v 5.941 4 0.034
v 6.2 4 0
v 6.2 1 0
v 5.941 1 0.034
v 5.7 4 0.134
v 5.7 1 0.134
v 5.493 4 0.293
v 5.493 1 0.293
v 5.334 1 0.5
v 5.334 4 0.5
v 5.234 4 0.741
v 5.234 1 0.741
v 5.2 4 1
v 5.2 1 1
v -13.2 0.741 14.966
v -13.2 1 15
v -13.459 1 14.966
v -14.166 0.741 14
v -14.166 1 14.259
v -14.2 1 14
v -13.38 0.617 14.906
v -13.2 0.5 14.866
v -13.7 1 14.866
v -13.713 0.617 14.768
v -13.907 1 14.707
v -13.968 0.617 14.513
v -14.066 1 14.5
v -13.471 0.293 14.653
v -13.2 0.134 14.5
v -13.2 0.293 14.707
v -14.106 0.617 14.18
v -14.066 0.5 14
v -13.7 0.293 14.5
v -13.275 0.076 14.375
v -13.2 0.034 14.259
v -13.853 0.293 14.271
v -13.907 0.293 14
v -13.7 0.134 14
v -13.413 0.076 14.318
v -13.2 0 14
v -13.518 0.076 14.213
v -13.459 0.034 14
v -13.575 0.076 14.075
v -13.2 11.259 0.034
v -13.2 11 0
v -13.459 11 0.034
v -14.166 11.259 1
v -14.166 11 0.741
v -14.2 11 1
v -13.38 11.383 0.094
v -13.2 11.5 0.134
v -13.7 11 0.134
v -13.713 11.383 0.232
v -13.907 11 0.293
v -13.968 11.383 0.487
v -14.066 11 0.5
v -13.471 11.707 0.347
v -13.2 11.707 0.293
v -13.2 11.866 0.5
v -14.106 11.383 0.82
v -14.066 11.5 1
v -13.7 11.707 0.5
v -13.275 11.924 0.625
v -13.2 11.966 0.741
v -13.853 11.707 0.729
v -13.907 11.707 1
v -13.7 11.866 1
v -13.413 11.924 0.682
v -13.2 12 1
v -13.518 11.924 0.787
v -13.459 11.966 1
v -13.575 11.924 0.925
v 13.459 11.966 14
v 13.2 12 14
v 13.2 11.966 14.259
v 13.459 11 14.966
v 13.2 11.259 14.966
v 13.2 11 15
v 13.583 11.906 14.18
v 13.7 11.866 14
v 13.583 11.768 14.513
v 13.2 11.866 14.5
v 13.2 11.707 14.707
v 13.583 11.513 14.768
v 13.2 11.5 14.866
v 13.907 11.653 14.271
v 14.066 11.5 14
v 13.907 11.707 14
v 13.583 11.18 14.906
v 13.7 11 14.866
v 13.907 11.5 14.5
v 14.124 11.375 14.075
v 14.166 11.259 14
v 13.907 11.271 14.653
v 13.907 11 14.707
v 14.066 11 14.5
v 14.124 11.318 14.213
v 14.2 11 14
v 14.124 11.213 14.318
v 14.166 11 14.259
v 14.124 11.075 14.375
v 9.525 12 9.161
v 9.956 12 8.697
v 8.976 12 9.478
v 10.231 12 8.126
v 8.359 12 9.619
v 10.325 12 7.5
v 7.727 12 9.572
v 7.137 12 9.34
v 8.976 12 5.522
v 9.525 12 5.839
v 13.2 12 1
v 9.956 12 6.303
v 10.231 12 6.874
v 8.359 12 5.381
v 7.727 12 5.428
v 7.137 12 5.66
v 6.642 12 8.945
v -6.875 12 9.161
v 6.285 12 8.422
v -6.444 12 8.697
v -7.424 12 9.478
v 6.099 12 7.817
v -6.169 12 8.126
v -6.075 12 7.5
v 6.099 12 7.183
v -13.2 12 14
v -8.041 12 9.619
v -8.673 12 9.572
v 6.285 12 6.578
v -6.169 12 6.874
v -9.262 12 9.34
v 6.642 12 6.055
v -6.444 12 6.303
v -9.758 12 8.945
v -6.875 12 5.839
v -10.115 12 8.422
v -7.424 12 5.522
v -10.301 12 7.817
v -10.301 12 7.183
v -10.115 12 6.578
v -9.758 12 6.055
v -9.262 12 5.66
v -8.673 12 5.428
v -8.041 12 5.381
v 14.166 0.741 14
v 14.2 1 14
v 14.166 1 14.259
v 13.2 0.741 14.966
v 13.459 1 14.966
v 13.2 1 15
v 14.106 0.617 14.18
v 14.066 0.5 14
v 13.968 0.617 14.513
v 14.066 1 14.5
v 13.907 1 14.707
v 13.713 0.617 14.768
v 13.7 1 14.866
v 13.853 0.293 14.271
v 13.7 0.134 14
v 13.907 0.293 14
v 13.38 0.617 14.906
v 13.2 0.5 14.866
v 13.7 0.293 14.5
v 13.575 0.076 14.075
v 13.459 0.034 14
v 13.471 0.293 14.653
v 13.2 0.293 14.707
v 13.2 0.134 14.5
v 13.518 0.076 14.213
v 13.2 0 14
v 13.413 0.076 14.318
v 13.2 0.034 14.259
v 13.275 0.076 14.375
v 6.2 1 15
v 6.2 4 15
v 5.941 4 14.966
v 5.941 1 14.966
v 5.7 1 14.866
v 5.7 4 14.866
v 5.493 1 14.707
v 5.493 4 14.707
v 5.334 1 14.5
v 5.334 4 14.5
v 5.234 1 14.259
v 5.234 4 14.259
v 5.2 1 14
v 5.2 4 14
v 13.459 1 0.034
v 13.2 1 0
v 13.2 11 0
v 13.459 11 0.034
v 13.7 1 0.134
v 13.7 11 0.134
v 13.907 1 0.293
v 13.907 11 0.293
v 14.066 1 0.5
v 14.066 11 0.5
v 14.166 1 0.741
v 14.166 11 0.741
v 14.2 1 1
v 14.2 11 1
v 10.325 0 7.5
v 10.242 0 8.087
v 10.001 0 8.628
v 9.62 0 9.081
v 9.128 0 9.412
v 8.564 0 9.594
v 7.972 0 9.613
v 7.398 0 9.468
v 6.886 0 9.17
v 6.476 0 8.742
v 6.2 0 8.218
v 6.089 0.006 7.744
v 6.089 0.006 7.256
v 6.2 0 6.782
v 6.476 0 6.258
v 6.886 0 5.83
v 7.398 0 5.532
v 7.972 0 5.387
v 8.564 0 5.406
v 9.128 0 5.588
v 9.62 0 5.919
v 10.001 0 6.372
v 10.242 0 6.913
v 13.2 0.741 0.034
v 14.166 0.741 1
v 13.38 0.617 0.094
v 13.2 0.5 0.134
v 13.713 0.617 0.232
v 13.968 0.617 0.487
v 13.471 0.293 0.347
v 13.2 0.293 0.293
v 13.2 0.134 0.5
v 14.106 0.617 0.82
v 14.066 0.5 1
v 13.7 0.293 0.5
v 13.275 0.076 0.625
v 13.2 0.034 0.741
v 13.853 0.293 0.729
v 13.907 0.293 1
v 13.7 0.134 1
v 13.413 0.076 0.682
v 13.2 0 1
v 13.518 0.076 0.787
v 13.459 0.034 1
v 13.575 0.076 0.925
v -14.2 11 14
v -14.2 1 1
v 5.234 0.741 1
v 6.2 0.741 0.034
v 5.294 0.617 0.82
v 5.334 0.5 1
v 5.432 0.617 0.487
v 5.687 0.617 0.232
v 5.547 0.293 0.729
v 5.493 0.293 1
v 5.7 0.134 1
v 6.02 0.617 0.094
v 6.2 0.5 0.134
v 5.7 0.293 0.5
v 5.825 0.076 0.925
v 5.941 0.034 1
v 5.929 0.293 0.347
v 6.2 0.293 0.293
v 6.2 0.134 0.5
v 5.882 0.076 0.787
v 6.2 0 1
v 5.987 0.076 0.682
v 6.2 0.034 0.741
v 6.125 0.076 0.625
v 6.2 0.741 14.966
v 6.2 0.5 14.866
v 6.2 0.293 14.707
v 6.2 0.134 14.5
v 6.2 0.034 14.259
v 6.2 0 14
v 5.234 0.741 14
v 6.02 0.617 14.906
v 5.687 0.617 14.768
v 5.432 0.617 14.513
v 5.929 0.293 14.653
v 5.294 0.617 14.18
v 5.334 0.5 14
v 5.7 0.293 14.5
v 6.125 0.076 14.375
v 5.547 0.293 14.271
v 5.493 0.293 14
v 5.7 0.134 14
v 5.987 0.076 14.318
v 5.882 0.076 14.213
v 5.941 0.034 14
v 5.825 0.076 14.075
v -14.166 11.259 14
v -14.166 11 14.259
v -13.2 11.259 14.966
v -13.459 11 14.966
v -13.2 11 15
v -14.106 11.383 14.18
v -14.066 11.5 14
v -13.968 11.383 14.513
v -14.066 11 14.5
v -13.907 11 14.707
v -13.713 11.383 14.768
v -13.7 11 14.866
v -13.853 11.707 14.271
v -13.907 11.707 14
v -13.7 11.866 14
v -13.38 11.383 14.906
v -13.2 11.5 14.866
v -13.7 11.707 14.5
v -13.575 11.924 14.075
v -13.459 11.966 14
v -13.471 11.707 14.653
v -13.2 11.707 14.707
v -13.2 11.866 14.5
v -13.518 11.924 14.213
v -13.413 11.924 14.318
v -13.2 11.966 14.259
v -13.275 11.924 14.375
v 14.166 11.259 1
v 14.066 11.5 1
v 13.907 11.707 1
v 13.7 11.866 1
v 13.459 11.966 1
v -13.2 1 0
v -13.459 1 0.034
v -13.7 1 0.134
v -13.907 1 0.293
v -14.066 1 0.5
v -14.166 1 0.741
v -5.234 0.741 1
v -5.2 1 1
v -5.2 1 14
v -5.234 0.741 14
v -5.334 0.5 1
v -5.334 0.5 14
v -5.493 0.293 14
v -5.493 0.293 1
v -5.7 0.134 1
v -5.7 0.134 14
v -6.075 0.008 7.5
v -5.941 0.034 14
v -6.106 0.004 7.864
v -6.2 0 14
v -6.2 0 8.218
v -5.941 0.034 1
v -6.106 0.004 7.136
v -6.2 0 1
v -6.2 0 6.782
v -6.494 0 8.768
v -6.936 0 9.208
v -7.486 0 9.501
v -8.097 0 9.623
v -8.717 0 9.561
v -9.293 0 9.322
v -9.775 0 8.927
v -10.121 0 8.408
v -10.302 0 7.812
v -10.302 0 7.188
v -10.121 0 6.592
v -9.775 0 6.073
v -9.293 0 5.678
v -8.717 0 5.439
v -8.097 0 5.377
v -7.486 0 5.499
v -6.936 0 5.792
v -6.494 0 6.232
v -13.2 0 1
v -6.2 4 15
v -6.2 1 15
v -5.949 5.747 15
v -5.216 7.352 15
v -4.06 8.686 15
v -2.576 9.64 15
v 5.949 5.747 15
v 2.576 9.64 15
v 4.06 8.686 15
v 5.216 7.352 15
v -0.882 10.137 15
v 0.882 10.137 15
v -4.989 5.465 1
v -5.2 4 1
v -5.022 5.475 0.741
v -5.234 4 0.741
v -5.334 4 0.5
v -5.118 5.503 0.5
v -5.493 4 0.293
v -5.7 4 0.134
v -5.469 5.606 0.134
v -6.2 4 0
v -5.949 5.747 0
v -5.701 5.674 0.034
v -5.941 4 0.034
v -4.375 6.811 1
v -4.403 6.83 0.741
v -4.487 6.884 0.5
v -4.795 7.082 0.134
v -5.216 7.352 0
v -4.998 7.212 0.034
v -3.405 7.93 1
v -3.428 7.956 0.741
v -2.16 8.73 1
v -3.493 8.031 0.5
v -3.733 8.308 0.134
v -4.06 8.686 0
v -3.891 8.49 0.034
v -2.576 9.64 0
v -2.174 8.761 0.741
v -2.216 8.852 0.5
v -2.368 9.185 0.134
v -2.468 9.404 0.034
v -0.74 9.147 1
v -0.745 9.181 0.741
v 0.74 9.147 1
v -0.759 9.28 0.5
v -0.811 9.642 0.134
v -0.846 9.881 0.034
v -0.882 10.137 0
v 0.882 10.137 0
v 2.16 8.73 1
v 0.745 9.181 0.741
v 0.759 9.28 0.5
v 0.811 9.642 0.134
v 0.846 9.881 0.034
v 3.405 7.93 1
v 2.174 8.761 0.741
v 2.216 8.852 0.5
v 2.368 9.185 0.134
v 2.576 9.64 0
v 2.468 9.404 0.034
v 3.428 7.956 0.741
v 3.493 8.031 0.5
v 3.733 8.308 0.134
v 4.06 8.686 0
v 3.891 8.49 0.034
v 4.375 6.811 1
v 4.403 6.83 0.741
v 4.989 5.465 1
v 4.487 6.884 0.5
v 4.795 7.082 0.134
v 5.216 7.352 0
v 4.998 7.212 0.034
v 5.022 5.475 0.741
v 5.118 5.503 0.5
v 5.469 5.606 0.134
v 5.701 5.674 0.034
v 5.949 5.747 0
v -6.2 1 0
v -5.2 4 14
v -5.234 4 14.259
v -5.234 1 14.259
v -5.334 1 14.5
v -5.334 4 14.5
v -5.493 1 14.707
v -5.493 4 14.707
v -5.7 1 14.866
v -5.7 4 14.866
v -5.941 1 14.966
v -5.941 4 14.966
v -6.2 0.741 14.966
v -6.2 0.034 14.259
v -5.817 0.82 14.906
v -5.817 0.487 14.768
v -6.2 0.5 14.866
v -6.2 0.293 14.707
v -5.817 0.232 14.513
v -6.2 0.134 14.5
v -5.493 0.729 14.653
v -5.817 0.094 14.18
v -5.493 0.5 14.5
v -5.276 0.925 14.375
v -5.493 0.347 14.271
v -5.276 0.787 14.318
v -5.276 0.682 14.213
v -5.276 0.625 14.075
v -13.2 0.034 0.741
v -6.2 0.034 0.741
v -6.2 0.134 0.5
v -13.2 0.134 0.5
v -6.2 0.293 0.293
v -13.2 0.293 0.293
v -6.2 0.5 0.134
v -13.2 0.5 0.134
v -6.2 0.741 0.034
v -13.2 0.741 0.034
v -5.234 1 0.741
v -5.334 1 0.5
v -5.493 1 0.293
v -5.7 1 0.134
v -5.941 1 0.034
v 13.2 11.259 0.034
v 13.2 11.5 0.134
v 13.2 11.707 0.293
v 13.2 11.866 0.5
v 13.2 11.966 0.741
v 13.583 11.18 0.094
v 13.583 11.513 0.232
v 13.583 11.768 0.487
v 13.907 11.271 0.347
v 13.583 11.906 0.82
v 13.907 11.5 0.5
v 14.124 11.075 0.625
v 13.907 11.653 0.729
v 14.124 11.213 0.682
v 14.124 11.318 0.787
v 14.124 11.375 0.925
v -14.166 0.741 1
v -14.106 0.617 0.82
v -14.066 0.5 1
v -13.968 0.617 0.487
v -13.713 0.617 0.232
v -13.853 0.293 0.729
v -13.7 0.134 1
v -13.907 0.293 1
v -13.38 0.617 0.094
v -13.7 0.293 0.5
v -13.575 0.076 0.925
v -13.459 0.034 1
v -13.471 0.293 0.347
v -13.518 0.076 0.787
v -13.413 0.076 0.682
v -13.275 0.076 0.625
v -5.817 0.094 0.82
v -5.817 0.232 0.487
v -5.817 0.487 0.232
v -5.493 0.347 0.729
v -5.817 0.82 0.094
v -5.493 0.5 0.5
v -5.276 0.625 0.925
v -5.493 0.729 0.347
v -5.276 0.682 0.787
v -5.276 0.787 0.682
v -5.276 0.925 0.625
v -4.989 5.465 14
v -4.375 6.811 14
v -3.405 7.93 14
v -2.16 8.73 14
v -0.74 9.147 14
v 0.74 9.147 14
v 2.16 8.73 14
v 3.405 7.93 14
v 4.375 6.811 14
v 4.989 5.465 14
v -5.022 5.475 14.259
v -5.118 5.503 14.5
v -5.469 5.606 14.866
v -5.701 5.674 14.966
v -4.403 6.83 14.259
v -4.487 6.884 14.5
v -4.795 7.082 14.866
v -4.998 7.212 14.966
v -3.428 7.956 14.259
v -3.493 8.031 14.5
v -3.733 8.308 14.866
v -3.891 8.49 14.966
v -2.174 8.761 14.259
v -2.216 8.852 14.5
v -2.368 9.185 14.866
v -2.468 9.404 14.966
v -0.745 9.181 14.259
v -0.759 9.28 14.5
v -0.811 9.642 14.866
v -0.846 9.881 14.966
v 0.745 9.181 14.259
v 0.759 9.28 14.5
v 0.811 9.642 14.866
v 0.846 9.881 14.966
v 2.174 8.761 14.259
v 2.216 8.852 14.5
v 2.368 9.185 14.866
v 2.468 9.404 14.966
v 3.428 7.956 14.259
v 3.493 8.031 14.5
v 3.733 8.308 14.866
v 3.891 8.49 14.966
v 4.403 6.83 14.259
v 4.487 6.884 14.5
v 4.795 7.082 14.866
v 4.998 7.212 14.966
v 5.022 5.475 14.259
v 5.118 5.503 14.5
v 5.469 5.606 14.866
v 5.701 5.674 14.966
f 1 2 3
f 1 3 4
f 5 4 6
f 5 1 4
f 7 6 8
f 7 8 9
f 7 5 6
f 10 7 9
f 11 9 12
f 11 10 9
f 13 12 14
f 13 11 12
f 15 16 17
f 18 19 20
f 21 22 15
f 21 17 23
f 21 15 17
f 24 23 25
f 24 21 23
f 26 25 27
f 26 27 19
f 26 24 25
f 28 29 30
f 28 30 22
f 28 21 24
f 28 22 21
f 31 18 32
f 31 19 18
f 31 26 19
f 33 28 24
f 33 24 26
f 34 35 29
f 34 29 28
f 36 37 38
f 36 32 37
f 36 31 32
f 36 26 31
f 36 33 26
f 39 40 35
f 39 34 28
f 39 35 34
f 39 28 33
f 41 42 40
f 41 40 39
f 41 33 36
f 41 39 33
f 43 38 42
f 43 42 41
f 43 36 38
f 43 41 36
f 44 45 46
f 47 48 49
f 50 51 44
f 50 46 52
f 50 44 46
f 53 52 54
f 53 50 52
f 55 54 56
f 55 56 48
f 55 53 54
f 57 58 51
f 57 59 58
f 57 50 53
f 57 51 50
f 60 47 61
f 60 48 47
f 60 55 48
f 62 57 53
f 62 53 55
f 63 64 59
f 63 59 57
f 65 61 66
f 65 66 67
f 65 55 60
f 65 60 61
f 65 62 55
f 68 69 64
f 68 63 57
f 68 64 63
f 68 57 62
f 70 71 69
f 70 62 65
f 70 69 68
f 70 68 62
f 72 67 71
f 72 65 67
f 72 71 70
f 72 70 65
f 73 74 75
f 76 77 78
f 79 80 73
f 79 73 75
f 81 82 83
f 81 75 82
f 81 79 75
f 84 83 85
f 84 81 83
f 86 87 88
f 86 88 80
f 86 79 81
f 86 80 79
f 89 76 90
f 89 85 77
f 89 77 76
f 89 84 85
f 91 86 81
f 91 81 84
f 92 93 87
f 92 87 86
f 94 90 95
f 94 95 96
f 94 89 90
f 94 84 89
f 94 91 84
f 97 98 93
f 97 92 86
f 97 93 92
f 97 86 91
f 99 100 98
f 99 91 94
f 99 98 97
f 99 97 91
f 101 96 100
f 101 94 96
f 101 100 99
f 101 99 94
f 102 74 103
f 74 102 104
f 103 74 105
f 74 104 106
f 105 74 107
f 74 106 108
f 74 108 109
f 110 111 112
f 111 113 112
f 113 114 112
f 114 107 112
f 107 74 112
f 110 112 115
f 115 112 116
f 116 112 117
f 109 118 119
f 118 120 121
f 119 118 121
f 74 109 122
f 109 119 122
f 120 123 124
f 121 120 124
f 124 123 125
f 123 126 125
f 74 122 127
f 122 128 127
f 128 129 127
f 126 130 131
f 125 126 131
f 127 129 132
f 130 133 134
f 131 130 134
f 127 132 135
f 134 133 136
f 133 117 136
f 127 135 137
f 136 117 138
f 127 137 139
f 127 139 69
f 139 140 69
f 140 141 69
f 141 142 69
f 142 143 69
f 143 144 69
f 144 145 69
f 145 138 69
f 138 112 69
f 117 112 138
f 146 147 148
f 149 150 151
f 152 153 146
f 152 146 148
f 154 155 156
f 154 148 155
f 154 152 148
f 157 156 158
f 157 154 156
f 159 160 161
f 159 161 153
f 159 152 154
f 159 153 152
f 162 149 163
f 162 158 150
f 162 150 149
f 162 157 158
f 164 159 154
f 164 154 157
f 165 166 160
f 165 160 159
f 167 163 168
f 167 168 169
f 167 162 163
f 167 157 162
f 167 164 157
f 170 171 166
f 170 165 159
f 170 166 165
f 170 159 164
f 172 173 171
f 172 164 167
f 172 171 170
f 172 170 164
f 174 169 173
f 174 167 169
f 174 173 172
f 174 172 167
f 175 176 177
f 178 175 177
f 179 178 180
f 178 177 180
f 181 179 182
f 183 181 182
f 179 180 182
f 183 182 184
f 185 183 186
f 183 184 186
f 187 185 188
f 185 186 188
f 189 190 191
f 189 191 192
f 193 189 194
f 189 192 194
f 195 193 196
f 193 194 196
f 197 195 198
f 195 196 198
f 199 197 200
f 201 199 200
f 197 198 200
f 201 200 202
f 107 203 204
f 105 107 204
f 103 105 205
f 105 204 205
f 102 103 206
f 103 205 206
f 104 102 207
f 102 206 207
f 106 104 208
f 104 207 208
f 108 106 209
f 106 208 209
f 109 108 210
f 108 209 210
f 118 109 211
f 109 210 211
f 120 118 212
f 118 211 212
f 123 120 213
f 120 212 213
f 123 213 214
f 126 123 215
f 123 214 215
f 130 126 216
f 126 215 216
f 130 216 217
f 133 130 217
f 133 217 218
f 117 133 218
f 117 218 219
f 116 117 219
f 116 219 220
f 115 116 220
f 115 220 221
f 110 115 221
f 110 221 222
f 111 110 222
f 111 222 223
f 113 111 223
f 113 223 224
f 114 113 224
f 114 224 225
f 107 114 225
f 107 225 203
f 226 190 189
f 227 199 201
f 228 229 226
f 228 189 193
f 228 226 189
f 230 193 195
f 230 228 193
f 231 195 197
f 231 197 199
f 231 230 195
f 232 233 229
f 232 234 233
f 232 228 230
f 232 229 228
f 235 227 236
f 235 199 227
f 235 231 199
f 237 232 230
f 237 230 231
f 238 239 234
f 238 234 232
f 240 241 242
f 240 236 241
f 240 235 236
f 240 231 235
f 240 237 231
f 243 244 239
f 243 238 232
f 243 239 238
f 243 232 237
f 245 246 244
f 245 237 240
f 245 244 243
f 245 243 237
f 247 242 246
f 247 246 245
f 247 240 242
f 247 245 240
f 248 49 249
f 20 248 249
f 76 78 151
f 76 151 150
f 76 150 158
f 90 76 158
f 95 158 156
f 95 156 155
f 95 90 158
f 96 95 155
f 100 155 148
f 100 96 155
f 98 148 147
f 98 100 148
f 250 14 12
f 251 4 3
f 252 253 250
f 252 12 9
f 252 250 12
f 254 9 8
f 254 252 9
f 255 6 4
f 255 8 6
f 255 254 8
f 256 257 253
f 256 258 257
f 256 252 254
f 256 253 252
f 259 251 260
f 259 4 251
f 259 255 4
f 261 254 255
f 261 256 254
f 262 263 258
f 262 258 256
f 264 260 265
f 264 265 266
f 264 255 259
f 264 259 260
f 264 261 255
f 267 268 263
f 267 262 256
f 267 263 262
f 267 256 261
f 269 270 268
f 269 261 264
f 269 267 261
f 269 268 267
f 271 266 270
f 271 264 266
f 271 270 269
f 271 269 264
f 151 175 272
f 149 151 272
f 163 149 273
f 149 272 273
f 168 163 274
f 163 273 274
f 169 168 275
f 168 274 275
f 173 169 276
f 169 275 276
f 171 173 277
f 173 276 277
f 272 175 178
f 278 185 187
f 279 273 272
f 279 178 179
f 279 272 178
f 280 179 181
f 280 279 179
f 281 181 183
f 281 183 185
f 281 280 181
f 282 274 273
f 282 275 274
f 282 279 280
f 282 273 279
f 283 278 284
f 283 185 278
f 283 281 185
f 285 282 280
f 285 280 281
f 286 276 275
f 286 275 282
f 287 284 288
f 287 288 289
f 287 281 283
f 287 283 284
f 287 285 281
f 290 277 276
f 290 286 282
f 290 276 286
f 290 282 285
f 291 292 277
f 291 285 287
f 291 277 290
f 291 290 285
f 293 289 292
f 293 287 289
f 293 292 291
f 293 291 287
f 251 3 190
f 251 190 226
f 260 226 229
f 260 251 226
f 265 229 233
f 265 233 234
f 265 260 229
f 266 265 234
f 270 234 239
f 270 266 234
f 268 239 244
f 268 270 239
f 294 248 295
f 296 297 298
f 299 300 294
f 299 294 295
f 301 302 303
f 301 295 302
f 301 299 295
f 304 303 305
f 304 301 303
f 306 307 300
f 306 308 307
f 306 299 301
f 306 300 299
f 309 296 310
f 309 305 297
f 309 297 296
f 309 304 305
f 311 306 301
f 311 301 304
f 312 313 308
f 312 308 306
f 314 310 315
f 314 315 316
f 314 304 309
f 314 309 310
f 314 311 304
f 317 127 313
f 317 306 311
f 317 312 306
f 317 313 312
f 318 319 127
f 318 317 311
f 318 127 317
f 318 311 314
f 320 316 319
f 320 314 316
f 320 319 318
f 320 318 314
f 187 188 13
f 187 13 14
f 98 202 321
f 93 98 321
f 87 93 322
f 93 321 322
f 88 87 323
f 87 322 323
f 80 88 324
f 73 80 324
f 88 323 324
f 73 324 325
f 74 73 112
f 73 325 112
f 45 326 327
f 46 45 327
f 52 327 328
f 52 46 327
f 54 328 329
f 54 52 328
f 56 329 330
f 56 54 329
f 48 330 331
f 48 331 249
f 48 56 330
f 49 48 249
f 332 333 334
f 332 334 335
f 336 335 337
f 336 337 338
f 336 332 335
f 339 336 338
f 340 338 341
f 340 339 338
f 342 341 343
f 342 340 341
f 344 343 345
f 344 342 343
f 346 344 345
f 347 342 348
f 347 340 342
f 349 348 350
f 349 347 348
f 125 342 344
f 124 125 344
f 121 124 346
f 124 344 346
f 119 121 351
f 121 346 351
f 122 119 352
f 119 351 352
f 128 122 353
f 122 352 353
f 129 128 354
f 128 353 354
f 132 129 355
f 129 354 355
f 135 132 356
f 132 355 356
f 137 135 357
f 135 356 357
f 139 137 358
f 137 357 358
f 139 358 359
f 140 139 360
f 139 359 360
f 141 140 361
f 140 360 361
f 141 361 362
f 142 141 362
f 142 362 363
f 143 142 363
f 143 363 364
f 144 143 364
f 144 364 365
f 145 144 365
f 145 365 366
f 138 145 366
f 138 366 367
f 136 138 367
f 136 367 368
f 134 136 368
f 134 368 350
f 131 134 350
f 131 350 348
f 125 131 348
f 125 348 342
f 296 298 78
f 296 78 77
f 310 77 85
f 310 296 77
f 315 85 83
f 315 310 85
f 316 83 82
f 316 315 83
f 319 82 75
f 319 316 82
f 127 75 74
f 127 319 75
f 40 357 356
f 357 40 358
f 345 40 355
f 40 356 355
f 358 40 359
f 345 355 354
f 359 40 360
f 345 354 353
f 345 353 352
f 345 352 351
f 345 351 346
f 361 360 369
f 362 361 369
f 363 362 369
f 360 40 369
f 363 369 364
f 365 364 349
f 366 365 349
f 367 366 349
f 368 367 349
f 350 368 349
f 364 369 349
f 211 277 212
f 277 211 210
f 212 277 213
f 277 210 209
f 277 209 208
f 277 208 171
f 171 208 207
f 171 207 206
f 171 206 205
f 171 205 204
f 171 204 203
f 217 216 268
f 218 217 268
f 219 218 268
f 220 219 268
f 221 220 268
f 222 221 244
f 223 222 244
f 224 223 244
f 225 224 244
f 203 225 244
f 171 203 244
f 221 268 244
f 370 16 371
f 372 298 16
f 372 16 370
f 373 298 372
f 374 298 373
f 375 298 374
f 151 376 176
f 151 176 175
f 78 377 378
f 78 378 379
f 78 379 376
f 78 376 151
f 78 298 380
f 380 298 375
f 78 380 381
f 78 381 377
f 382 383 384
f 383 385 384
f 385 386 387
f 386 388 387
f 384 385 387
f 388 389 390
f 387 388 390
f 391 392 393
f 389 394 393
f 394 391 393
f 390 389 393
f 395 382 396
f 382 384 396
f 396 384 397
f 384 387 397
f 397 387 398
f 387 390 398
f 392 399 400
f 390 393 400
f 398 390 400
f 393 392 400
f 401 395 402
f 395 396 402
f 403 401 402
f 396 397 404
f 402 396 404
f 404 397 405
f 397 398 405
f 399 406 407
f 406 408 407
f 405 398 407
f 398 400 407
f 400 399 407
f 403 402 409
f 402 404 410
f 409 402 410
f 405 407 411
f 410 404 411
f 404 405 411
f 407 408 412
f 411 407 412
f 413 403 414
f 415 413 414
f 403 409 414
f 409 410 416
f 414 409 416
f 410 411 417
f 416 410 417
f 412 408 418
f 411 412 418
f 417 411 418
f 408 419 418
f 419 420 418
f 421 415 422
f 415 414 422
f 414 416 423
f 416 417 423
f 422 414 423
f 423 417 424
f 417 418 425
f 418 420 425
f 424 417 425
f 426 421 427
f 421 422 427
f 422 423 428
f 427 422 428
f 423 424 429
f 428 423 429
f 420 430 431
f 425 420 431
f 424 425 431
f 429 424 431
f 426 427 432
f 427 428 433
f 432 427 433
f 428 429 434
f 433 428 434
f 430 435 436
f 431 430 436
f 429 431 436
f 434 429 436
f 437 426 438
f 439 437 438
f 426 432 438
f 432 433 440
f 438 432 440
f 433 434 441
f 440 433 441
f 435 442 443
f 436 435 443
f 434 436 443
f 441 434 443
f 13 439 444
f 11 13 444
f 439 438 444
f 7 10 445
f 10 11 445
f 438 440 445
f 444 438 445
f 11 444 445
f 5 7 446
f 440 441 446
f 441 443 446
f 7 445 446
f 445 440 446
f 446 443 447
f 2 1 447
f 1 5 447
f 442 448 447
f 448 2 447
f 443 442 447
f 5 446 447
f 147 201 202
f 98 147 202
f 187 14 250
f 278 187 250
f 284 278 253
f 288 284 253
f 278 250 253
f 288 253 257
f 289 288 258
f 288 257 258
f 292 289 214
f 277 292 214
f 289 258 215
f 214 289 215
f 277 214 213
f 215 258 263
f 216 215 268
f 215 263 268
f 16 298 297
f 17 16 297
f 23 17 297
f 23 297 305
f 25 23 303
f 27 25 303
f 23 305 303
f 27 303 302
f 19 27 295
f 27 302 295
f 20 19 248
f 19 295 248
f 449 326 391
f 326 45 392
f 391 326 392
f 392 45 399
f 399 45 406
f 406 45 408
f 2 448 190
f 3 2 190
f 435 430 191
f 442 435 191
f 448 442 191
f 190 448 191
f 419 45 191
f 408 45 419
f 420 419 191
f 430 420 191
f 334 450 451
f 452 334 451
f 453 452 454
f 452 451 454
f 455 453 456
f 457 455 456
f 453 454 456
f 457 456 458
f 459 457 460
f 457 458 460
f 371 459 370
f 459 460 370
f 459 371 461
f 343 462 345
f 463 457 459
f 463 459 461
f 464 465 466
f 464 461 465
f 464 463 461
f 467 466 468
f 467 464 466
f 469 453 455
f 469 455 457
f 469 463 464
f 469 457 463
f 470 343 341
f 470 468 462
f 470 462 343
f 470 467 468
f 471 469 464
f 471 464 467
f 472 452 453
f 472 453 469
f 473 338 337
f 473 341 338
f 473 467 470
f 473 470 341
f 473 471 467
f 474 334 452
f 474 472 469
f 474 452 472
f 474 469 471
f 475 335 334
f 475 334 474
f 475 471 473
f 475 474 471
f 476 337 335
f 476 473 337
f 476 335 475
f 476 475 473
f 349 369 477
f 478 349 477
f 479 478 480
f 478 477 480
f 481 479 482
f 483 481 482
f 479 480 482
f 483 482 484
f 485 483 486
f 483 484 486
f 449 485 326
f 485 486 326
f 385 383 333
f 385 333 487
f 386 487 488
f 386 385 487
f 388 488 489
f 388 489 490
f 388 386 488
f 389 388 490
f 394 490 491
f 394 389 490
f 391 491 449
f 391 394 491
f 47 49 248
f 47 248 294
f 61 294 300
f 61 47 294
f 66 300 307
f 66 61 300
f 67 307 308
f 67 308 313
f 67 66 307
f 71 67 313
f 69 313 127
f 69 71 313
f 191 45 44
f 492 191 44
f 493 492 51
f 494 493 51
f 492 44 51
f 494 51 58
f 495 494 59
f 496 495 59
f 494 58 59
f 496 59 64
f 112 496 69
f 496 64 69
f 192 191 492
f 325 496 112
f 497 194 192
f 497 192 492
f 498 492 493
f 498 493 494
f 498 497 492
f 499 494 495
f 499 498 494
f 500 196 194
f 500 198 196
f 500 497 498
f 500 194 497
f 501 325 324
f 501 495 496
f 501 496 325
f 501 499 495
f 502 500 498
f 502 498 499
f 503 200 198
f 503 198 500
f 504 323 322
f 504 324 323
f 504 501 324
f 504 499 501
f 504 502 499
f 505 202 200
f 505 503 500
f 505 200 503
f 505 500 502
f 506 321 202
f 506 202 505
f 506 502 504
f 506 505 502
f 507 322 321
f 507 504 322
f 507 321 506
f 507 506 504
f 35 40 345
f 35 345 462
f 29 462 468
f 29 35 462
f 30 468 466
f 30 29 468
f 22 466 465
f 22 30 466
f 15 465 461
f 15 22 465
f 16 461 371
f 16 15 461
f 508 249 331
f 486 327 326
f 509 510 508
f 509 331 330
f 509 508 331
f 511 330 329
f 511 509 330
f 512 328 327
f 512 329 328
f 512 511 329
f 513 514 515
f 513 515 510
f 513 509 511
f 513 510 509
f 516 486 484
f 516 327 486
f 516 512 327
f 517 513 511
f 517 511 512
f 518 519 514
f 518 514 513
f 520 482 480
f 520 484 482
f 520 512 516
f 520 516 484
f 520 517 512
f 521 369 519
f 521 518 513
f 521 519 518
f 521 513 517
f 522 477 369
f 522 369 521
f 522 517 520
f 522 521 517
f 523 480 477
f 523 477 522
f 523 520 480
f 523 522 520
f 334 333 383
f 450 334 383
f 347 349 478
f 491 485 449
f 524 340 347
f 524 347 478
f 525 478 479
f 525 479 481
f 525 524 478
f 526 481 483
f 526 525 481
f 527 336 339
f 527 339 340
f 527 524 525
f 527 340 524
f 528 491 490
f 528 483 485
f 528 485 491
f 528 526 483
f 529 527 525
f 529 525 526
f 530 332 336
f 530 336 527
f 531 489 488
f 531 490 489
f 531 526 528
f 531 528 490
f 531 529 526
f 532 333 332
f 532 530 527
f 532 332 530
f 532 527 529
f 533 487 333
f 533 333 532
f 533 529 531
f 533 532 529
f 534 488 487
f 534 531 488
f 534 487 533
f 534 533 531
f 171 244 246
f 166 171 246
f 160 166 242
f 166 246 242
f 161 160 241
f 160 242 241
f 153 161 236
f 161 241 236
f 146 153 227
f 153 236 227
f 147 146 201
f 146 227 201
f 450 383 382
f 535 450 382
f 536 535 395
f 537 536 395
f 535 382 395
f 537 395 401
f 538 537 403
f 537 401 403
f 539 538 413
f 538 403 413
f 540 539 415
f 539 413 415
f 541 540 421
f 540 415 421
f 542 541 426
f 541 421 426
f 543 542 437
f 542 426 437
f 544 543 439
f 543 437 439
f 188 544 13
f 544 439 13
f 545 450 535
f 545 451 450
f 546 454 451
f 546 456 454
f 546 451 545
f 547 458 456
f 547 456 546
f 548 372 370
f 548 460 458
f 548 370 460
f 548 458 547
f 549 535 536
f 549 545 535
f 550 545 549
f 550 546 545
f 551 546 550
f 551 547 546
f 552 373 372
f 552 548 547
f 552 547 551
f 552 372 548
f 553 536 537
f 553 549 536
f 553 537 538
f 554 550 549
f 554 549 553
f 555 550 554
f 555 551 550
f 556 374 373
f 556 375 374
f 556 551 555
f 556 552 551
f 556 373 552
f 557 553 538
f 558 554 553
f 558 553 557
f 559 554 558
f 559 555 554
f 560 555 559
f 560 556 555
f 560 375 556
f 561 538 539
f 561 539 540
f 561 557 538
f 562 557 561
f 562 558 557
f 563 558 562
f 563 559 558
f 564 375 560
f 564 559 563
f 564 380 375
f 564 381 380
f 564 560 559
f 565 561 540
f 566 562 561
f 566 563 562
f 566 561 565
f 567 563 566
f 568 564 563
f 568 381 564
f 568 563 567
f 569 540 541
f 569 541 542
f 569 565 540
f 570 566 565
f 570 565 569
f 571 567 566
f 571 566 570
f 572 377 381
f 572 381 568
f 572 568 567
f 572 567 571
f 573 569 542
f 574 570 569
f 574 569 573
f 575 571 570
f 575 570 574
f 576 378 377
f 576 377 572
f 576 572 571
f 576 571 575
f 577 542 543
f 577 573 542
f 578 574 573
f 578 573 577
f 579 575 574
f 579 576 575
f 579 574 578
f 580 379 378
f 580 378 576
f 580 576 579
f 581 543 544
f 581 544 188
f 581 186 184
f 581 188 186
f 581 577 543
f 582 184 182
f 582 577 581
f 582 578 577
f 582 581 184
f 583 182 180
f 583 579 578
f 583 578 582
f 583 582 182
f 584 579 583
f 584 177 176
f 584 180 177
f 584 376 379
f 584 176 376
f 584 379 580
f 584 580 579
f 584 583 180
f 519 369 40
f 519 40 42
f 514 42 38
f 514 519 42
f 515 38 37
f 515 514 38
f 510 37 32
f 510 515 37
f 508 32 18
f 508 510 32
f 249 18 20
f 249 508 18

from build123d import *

# Parameters (mm, degrees)
F1_DEPTH     = 15
F2_R         = 2.125
F3_DEPTH     = 12.001
F4_T1_DEPTH  = 3
F4_T3_DEPTH  = 7
F4_T5_DEPTH  = 10
F4_T7_DEPTH  = 26.4
F4_T9_DEPTH  = 7
F4_T11_DEPTH = 13
F4_S15_W     = 1
F4_S15_H     = 1
F4_T16_DEPTH = 1
F4_S21_W     = 1
F4_S21_H     = 1
F4_T22_DEPTH = 1
F4_S27_W     = 1
F4_S27_H     = 1
F4_T28_DEPTH = 1
F4_S33_W     = 1
F4_S33_H     = 1
F4_T34_DEPTH = 1
F4_S39_W     = 1
F4_S39_H     = 1
F4_T40_DEPTH = 1
F4_S45_W     = 1
F4_S45_H     = 1
F4_T46_DEPTH = 1
F4_S51_W     = 1
F4_S51_H     = 1
F4_T52_DEPTH = 1
F4_S57_W     = 1
F4_S57_H     = 1
F4_T58_DEPTH = 1
F4_S63_W     = 1
F4_S63_H     = 1
F4_T64_DEPTH = 1
F4_S69_W     = 1
F4_S69_H     = 1
F4_T70_DEPTH = 1
F4_S75_W     = 1
F4_S75_H     = 1
F4_T76_DEPTH = 1
F4_S81_W     = 1
F4_S81_H     = 1
F4_T82_DEPTH = 1
F4_T86_ANGLE = 180
F4_T88_ANGLE = 180


# Not quite as in the source:
# - a fillet or chamfer that OpenCascade refuses, or shapes differently, is made with other operations: its cross-section is extruded or revolved along the edge and cut away or added


with BuildPart() as f1:
    # F0 (on Top) → F1 (new body)
    with BuildSketch(Plane.XY):
        with BuildLine():
            Line((5.2, 4), (5.2, 0))
            Line((5.2, 0), (14.2, 0))
            Line((14.2, 0), (14.2, 12))
            Line((14.2, 12), (-14.2, 12))
            Line((-14.2, 12), (-14.2, 0))
            Line((-14.2, 0), (-5.2, 0))
            Line((-5.2, 0), (-5.2, 4))
            ThreePointArc((-5.2, 4), (0, 9.2), (5.2, 4))
        make_face()
    extrude(amount=F1_DEPTH)

    # F2 (on face) → F3 (cut, through all)
    with BuildSketch(Plane.XZ):
        with Locations((-8.2, 7.5)):
            Circle(F2_R)
        with Locations((8.2, 7.5)):
            Circle(F2_R)
    extrude(amount=-F3_DEPTH, mode=Mode.SUBTRACT)

    # F4: fillet of radius 1 on 22 edges, made by hand

    # F4_s2 → F4_t1 (cut)
    with BuildSketch(Plane.XZ.offset(-4)):
        with BuildLine():
            ThreePointArc((-5.2, 14), (-5.4928932188, 14.7071067812), (-6.2, 15))
            Line((-6.2, 15), (-5.2, 15))
            Line((-5.2, 15), (-5.2, 14))
        make_face()
        with BuildLine():
            ThreePointArc((6.2, 15), (5.4928932188, 14.7071067812), (5.2, 14))
            Line((5.2, 14), (5.2, 15))
            Line((5.2, 15), (6.2, 15))
        make_face()
        with BuildLine():
            ThreePointArc((-5.2, 1), (-5.4928932188, 0.2928932188), (-6.2, 0))
            Line((-6.2, 0), (-5.2, 0))
            Line((-5.2, 0), (-5.2, 1))
        make_face()
        with BuildLine():
            ThreePointArc((6.2, 0), (5.4928932188, 0.2928932188), (5.2, 1))
            Line((5.2, 1), (5.2, 0))
            Line((5.2, 0), (6.2, 0))
        make_face()
    extrude(amount=F4_T1_DEPTH, mode=Mode.SUBTRACT)

    # F4_s4 → F4_t3 (cut)
    with BuildSketch(Plane.YZ.offset(6.2)):
        with BuildLine():
            ThreePointArc((1, 15), (0.2928932188, 14.7071067812), (0, 14))
            Line((0, 14), (0, 15))
            Line((0, 15), (1, 15))
        make_face()
        with BuildLine():
            ThreePointArc((1, 0), (0.2928932188, 0.2928932188), (0, 1))
            Line((0, 1), (0, 0))
            Line((0, 0), (1, 0))
        make_face()
    extrude(amount=F4_T3_DEPTH, mode=Mode.SUBTRACT)

    # F4_s6 → F4_t5 (cut)
    with BuildSketch(Plane.XZ.offset(-11)):
        with BuildLine():
            ThreePointArc((13.2, 15), (13.9071067812, 14.7071067812), (14.2, 14))
            Line((14.2, 14), (14.2, 15))
            Line((14.2, 15), (13.2, 15))
        make_face()
        with BuildLine():
            ThreePointArc((-13.2, 15), (-13.9071067812, 14.7071067812), (-14.2, 14))
            Line((-14.2, 14), (-14.2, 15))
            Line((-14.2, 15), (-13.2, 15))
        make_face()
        with BuildLine():
            ThreePointArc((-13.2, 0), (-13.9071067812, 0.2928932188), (-14.2, 1))
            Line((-14.2, 1), (-14.2, 0))
            Line((-14.2, 0), (-13.2, 0))
        make_face()
        with BuildLine():
            ThreePointArc((13.2, 0), (13.9071067812, 0.2928932188), (14.2, 1))
            Line((14.2, 1), (14.2, 0))
            Line((14.2, 0), (13.2, 0))
        make_face()
    extrude(amount=F4_T5_DEPTH, mode=Mode.SUBTRACT)

    # F4_s8 → F4_t7 (cut)
    with BuildSketch(Plane.YZ.offset(-13.2)):
        with BuildLine():
            ThreePointArc((11, 15), (11.7071067812, 14.7071067812), (12, 14))
            Line((12, 14), (12, 15))
            Line((12, 15), (11, 15))
        make_face()
        with BuildLine():
            ThreePointArc((11, 0), (11.7071067812, 0.2928932188), (12, 1))
            Line((12, 1), (12, 0))
            Line((12, 0), (11, 0))
        make_face()
    extrude(amount=F4_T7_DEPTH, mode=Mode.SUBTRACT)

    # F4_s10 → F4_t9 (cut)
    with BuildSketch(Plane.YZ.offset(-13.2)):
        with BuildLine():
            ThreePointArc((0, 14), (0.2928932188, 14.7071067812), (1, 15))
            Line((1, 15), (0, 15))
            Line((0, 15), (0, 14))
        make_face()
        with BuildLine():
            ThreePointArc((0, 1), (0.2928932188, 0.2928932188), (1, 0))
            Line((1, 0), (0, 0))
            Line((0, 0), (0, 1))
        make_face()
    extrude(amount=F4_T9_DEPTH, mode=Mode.SUBTRACT)

    # F4_s12 → F4_t11 (cut)
    with BuildSketch(Plane.XY.offset(1)):
        with BuildLine():
            ThreePointArc((-14.2, 11), (-13.9071067812, 11.7071067812), (-13.2, 12))
            Line((-13.2, 12), (-14.2, 12))
            Line((-14.2, 12), (-14.2, 11))
        make_face()
        with BuildLine():
            ThreePointArc((-13.2, 0), (-13.9071067812, 0.2928932188), (-14.2, 1))
            Line((-14.2, 1), (-14.2, 0))
            Line((-14.2, 0), (-13.2, 0))
        make_face()
        with BuildLine():
            ThreePointArc((13.2, 0), (13.9071067812, 0.2928932188), (14.2, 1))
            Line((14.2, 1), (14.2, 0))
            Line((14.2, 0), (13.2, 0))
        make_face()
        with BuildLine():
            ThreePointArc((14.2, 11), (13.9071067812, 11.7071067812), (13.2, 12))
            Line((13.2, 12), (14.2, 12))
            Line((14.2, 12), (14.2, 11))
        make_face()
        with BuildLine():
            ThreePointArc((-5.2, 1), (-5.4928932188, 0.2928932188), (-6.2, 0))
            Line((-6.2, 0), (-5.2, 0))
            Line((-5.2, 0), (-5.2, 1))
        make_face()
        with BuildLine():
            ThreePointArc((5.2, 1), (5.4928932188, 0.2928932188), (6.2, 0))
            Line((6.2, 0), (5.2, 0))
            Line((5.2, 0), (5.2, 1))
        make_face()
    extrude(amount=F4_T11_DEPTH, mode=Mode.SUBTRACT)


with BuildPart() as f4_tool14:
    # F4_s15 → F4_t16 (new body)
    with BuildSketch(Plane.YZ.offset(-6.2)):
        with Locations((0.5, 14.5)):
            Rectangle(F4_S15_W, F4_S15_H)
    extrude(amount=F4_T16_DEPTH)

    # F4_s17 → F4_t18 (revolve, cut)
    with BuildSketch(Plane(origin=(-6.2, 1, 14), x_dir=(0, 0.7071067812, -0.7071067812), z_dir=(0, -0.7071067812, -0.7071067812))):
        with BuildLine():
            ThreePointArc((0, -1), (1, 0), (0, 1))
            Line((0, 1), (0, -1))
        make_face()
    revolve(axis=Axis((-6.2, 1, 14), (1, 0, 0)), mode=Mode.SUBTRACT)


with BuildPart() as f1_1:
    add(f1.part)

    # F4_t13: cut F4_tool14
    add(f4_tool14.part, mode=Mode.SUBTRACT)


with BuildPart() as f4_tool20:
    # F4_s21 → F4_t22 (new body)
    with BuildSketch(Plane.XZ.offset(-1)):
        with Locations((5.7, 14.5)):
            Rectangle(F4_S21_W, F4_S21_H)
    extrude(amount=F4_T22_DEPTH)

    # F4_s23 → F4_t24 (revolve, cut)
    with BuildSketch(Plane(origin=(6.2, 1, 14), x_dir=(0.7071067812, 0, -0.7071067812), z_dir=(-0.7071067812, 0, -0.7071067812))):
        with BuildLine():
            ThreePointArc((0, -1), (1, 0), (0, 1))
            Line((0, 1), (0, -1))
        make_face()
    revolve(axis=Axis((6.2, 1, 14), (0, -1, 0)), mode=Mode.SUBTRACT)


with BuildPart() as f1_2:
    add(f1_1.part)

    # F4_t19: cut F4_tool20
    add(f4_tool20.part, mode=Mode.SUBTRACT)


with BuildPart() as f4_tool26:
    # F4_s27 → F4_t28 (new body)
    with BuildSketch(Plane.XZ.offset(-1)):
        with Locations((13.7, 14.5)):
            Rectangle(F4_S27_W, F4_S27_H)
    extrude(amount=F4_T28_DEPTH)

    # F4_s29 → F4_t30 (revolve, cut)
    with BuildSketch(Plane(origin=(13.2, 1, 14), x_dir=(-0.7071067812, 0, -0.7071067812), z_dir=(-0.7071067812, 0, 0.7071067812))):
        with BuildLine():
            ThreePointArc((0, -1), (1, 0), (0, 1))
            Line((0, 1), (0, -1))
        make_face()
    revolve(axis=Axis((13.2, 1, 14), (0, -1, 0)), mode=Mode.SUBTRACT)


with BuildPart() as f1_3:
    add(f1_2.part)

    # F4_t25: cut F4_tool26
    add(f4_tool26.part, mode=Mode.SUBTRACT)


with BuildPart() as f4_tool32:
    # F4_s33 → F4_t34 (new body)
    with BuildSketch(Plane.YZ.offset(13.2)):
        with Locations((11.5, 14.5)):
            Rectangle(F4_S33_W, F4_S33_H)
    extrude(amount=F4_T34_DEPTH)

    # F4_s35 → F4_t36 (revolve, cut)
    with BuildSketch(Plane(origin=(13.2, 11, 14), x_dir=(0, -0.7071067812, -0.7071067812), z_dir=(0, -0.7071067812, 0.7071067812))):
        with BuildLine():
            ThreePointArc((0, -1), (1, 0), (0, 1))
            Line((0, 1), (0, -1))
        make_face()
    revolve(axis=Axis((13.2, 11, 14), (1, 0, 0)), mode=Mode.SUBTRACT)


with BuildPart() as f1_4:
    add(f1_3.part)

    # F4_t31: cut F4_tool32
    add(f4_tool32.part, mode=Mode.SUBTRACT)


with BuildPart() as f4_tool38:
    # F4_s39 → F4_t40 (new body)
    with BuildSketch(Plane.XZ.offset(-11)):
        with Locations((-13.7, 14.5)):
            Rectangle(F4_S39_W, F4_S39_H)
    extrude(amount=-F4_T40_DEPTH)

    # F4_s41 → F4_t42 (revolve, cut)
    with BuildSketch(Plane(origin=(-13.2, 11, 14), x_dir=(0.7071067812, 0, -0.7071067812), z_dir=(0.7071067812, 0, 0.7071067812))):
        with BuildLine():
            ThreePointArc((0, -1), (1, 0), (0, 1))
            Line((0, 1), (0, -1))
        make_face()
    revolve(axis=Axis((-13.2, 11, 14), (0, 1, 0)), mode=Mode.SUBTRACT)


with BuildPart() as f1_5:
    add(f1_4.part)

    # F4_t37: cut F4_tool38
    add(f4_tool38.part, mode=Mode.SUBTRACT)


with BuildPart() as f4_tool44:
    # F4_s45 → F4_t46 (new body)
    with BuildSketch(Plane.XZ.offset(-1)):
        with Locations((-13.7, 14.5)):
            Rectangle(F4_S45_W, F4_S45_H)
    extrude(amount=F4_T46_DEPTH)

    # F4_s47 → F4_t48 (revolve, cut)
    with BuildSketch(Plane(origin=(-13.2, 1, 14), x_dir=(0.7071067812, 0, -0.7071067812), z_dir=(-0.7071067812, 0, -0.7071067812))):
        with BuildLine():
            ThreePointArc((0, -1), (1, 0), (0, 1))
            Line((0, 1), (0, -1))
        make_face()
    revolve(axis=Axis((-13.2, 1, 14), (0, -1, 0)), mode=Mode.SUBTRACT)


with BuildPart() as f1_6:
    add(f1_5.part)

    # F4_t43: cut F4_tool44
    add(f4_tool44.part, mode=Mode.SUBTRACT)


with BuildPart() as f4_tool50:
    # F4_s51 → F4_t52 (new body)
    with BuildSketch(Plane.XZ.offset(-11)):
        with Locations((-13.7, 0.5)):
            Rectangle(F4_S51_W, F4_S51_H)
    extrude(amount=-F4_T52_DEPTH)

    # F4_s53 → F4_t54 (revolve, cut)
    with BuildSketch(Plane(origin=(-13.2, 11, 1), x_dir=(0.7071067812, 0, 0.7071067812), z_dir=(-0.7071067812, 0, 0.7071067812))):
        with BuildLine():
            ThreePointArc((0, -1), (1, 0), (0, 1))
            Line((0, 1), (0, -1))
        make_face()
    revolve(axis=Axis((-13.2, 11, 1), (0, 1, 0)), mode=Mode.SUBTRACT)


with BuildPart() as f1_7:
    add(f1_6.part)

    # F4_t49: cut F4_tool50
    add(f4_tool50.part, mode=Mode.SUBTRACT)


with BuildPart() as f4_tool56:
    # F4_s57 → F4_t58 (new body)
    with BuildSketch(Plane.XZ.offset(-1)):
        with Locations((-13.7, 0.5)):
            Rectangle(F4_S57_W, F4_S57_H)
    extrude(amount=F4_T58_DEPTH)

    # F4_s59 → F4_t60 (revolve, cut)
    with BuildSketch(Plane(origin=(-13.2, 1, 1), x_dir=(0.7071067812, 0, 0.7071067812), z_dir=(0.7071067812, 0, -0.7071067812))):
        with BuildLine():
            ThreePointArc((0, -1), (1, 0), (0, 1))
            Line((0, 1), (0, -1))
        make_face()
    revolve(axis=Axis((-13.2, 1, 1), (0, -1, 0)), mode=Mode.SUBTRACT)


with BuildPart() as f1_8:
    add(f1_7.part)

    # F4_t55: cut F4_tool56
    add(f4_tool56.part, mode=Mode.SUBTRACT)


with BuildPart() as f4_tool62:
    # F4_s63 → F4_t64 (new body)
    with BuildSketch(Plane.YZ.offset(-6.2)):
        with Locations((0.5, 0.5)):
            Rectangle(F4_S63_W, F4_S63_H)
    extrude(amount=F4_T64_DEPTH)

    # F4_s65 → F4_t66 (revolve, cut)
    with BuildSketch(Plane(origin=(-6.2, 1, 1), x_dir=(0, 0.7071067812, 0.7071067812), z_dir=(0, 0.7071067812, -0.7071067812))):
        with BuildLine():
            ThreePointArc((0, -1), (1, 0), (0, 1))
            Line((0, 1), (0, -1))
        make_face()
    revolve(axis=Axis((-6.2, 1, 1), (1, 0, 0)), mode=Mode.SUBTRACT)


with BuildPart() as f1_9:
    add(f1_8.part)

    # F4_t61: cut F4_tool62
    add(f4_tool62.part, mode=Mode.SUBTRACT)


with BuildPart() as f4_tool68:
    # F4_s69 → F4_t70 (new body)
    with BuildSketch(Plane.XZ.offset(-1)):
        with Locations((5.7, 0.5)):
            Rectangle(F4_S69_W, F4_S69_H)
    extrude(amount=F4_T70_DEPTH)

    # F4_s71 → F4_t72 (revolve, cut)
    with BuildSketch(Plane(origin=(6.2, 1, 1), x_dir=(0.7071067812, 0, 0.7071067812), z_dir=(0.7071067812, 0, -0.7071067812))):
        with BuildLine():
            ThreePointArc((0, -1), (1, 0), (0, 1))
            Line((0, 1), (0, -1))
        make_face()
    revolve(axis=Axis((6.2, 1, 1), (0, -1, 0)), mode=Mode.SUBTRACT)


with BuildPart() as f1_10:
    add(f1_9.part)

    # F4_t67: cut F4_tool68
    add(f4_tool68.part, mode=Mode.SUBTRACT)


with BuildPart() as f4_tool74:
    # F4_s75 → F4_t76 (new body)
    with BuildSketch(Plane.XZ.offset(-1)):
        with Locations((13.7, 0.5)):
            Rectangle(F4_S75_W, F4_S75_H)
    extrude(amount=F4_T76_DEPTH)

    # F4_s77 → F4_t78 (revolve, cut)
    with BuildSketch(Plane(origin=(13.2, 1, 1), x_dir=(-0.7071067812, 0, 0.7071067812), z_dir=(0.7071067812, 0, 0.7071067812))):
        with BuildLine():
            ThreePointArc((0, -1), (1, 0), (0, 1))
            Line((0, 1), (0, -1))
        make_face()
    revolve(axis=Axis((13.2, 1, 1), (0, -1, 0)), mode=Mode.SUBTRACT)


with BuildPart() as f1_11:
    add(f1_10.part)

    # F4_t73: cut F4_tool74
    add(f4_tool74.part, mode=Mode.SUBTRACT)


with BuildPart() as f4_tool80:
    # F4_s81 → F4_t82 (new body)
    with BuildSketch(Plane.YZ.offset(13.2)):
        with Locations((11.5, 0.5)):
            Rectangle(F4_S81_W, F4_S81_H)
    extrude(amount=F4_T82_DEPTH)

    # F4_s83 → F4_t84 (revolve, cut)
    with BuildSketch(Plane(origin=(13.2, 11, 1), x_dir=(0, -0.7071067812, 0.7071067812), z_dir=(0, 0.7071067812, 0.7071067812))):
        with BuildLine():
            ThreePointArc((0, -1), (1, 0), (0, 1))
            Line((0, 1), (0, -1))
        make_face()
    revolve(axis=Axis((13.2, 11, 1), (1, 0, 0)), mode=Mode.SUBTRACT)


with BuildPart() as f1_12:
    add(f1_11.part)

    # F4_t79: cut F4_tool80
    add(f4_tool80.part, mode=Mode.SUBTRACT)

    # F4_s85 → F4_t86 (revolve, cut)
    with BuildSketch(Plane.XZ.offset(-4)):
        with BuildLine():
            ThreePointArc((-5.2, 14), (-5.4928932188, 14.7071067812), (-6.2, 15))
            Line((-6.2, 15), (-5.2, 15))
            Line((-5.2, 15), (-5.2, 14))
        make_face()
    revolve(axis=Axis((0, 4, 15), (0, 0, -1)), revolution_arc=F4_T86_ANGLE, mode=Mode.SUBTRACT)

    # F4_s87 → F4_t88 (revolve, cut)
    with BuildSketch(Plane.XZ.offset(-4)):
        with BuildLine():
            ThreePointArc((-5.2, 1), (-5.4928932188, 0.2928932188), (-6.2, 0))
            Line((-6.2, 0), (-5.2, 0))
            Line((-5.2, 0), (-5.2, 1))
        make_face()
    revolve(axis=Axis((0, 4, 0), (0, 0, -1)), revolution_arc=F4_T88_ANGLE, mode=Mode.SUBTRACT)


solid = f1_12.part
